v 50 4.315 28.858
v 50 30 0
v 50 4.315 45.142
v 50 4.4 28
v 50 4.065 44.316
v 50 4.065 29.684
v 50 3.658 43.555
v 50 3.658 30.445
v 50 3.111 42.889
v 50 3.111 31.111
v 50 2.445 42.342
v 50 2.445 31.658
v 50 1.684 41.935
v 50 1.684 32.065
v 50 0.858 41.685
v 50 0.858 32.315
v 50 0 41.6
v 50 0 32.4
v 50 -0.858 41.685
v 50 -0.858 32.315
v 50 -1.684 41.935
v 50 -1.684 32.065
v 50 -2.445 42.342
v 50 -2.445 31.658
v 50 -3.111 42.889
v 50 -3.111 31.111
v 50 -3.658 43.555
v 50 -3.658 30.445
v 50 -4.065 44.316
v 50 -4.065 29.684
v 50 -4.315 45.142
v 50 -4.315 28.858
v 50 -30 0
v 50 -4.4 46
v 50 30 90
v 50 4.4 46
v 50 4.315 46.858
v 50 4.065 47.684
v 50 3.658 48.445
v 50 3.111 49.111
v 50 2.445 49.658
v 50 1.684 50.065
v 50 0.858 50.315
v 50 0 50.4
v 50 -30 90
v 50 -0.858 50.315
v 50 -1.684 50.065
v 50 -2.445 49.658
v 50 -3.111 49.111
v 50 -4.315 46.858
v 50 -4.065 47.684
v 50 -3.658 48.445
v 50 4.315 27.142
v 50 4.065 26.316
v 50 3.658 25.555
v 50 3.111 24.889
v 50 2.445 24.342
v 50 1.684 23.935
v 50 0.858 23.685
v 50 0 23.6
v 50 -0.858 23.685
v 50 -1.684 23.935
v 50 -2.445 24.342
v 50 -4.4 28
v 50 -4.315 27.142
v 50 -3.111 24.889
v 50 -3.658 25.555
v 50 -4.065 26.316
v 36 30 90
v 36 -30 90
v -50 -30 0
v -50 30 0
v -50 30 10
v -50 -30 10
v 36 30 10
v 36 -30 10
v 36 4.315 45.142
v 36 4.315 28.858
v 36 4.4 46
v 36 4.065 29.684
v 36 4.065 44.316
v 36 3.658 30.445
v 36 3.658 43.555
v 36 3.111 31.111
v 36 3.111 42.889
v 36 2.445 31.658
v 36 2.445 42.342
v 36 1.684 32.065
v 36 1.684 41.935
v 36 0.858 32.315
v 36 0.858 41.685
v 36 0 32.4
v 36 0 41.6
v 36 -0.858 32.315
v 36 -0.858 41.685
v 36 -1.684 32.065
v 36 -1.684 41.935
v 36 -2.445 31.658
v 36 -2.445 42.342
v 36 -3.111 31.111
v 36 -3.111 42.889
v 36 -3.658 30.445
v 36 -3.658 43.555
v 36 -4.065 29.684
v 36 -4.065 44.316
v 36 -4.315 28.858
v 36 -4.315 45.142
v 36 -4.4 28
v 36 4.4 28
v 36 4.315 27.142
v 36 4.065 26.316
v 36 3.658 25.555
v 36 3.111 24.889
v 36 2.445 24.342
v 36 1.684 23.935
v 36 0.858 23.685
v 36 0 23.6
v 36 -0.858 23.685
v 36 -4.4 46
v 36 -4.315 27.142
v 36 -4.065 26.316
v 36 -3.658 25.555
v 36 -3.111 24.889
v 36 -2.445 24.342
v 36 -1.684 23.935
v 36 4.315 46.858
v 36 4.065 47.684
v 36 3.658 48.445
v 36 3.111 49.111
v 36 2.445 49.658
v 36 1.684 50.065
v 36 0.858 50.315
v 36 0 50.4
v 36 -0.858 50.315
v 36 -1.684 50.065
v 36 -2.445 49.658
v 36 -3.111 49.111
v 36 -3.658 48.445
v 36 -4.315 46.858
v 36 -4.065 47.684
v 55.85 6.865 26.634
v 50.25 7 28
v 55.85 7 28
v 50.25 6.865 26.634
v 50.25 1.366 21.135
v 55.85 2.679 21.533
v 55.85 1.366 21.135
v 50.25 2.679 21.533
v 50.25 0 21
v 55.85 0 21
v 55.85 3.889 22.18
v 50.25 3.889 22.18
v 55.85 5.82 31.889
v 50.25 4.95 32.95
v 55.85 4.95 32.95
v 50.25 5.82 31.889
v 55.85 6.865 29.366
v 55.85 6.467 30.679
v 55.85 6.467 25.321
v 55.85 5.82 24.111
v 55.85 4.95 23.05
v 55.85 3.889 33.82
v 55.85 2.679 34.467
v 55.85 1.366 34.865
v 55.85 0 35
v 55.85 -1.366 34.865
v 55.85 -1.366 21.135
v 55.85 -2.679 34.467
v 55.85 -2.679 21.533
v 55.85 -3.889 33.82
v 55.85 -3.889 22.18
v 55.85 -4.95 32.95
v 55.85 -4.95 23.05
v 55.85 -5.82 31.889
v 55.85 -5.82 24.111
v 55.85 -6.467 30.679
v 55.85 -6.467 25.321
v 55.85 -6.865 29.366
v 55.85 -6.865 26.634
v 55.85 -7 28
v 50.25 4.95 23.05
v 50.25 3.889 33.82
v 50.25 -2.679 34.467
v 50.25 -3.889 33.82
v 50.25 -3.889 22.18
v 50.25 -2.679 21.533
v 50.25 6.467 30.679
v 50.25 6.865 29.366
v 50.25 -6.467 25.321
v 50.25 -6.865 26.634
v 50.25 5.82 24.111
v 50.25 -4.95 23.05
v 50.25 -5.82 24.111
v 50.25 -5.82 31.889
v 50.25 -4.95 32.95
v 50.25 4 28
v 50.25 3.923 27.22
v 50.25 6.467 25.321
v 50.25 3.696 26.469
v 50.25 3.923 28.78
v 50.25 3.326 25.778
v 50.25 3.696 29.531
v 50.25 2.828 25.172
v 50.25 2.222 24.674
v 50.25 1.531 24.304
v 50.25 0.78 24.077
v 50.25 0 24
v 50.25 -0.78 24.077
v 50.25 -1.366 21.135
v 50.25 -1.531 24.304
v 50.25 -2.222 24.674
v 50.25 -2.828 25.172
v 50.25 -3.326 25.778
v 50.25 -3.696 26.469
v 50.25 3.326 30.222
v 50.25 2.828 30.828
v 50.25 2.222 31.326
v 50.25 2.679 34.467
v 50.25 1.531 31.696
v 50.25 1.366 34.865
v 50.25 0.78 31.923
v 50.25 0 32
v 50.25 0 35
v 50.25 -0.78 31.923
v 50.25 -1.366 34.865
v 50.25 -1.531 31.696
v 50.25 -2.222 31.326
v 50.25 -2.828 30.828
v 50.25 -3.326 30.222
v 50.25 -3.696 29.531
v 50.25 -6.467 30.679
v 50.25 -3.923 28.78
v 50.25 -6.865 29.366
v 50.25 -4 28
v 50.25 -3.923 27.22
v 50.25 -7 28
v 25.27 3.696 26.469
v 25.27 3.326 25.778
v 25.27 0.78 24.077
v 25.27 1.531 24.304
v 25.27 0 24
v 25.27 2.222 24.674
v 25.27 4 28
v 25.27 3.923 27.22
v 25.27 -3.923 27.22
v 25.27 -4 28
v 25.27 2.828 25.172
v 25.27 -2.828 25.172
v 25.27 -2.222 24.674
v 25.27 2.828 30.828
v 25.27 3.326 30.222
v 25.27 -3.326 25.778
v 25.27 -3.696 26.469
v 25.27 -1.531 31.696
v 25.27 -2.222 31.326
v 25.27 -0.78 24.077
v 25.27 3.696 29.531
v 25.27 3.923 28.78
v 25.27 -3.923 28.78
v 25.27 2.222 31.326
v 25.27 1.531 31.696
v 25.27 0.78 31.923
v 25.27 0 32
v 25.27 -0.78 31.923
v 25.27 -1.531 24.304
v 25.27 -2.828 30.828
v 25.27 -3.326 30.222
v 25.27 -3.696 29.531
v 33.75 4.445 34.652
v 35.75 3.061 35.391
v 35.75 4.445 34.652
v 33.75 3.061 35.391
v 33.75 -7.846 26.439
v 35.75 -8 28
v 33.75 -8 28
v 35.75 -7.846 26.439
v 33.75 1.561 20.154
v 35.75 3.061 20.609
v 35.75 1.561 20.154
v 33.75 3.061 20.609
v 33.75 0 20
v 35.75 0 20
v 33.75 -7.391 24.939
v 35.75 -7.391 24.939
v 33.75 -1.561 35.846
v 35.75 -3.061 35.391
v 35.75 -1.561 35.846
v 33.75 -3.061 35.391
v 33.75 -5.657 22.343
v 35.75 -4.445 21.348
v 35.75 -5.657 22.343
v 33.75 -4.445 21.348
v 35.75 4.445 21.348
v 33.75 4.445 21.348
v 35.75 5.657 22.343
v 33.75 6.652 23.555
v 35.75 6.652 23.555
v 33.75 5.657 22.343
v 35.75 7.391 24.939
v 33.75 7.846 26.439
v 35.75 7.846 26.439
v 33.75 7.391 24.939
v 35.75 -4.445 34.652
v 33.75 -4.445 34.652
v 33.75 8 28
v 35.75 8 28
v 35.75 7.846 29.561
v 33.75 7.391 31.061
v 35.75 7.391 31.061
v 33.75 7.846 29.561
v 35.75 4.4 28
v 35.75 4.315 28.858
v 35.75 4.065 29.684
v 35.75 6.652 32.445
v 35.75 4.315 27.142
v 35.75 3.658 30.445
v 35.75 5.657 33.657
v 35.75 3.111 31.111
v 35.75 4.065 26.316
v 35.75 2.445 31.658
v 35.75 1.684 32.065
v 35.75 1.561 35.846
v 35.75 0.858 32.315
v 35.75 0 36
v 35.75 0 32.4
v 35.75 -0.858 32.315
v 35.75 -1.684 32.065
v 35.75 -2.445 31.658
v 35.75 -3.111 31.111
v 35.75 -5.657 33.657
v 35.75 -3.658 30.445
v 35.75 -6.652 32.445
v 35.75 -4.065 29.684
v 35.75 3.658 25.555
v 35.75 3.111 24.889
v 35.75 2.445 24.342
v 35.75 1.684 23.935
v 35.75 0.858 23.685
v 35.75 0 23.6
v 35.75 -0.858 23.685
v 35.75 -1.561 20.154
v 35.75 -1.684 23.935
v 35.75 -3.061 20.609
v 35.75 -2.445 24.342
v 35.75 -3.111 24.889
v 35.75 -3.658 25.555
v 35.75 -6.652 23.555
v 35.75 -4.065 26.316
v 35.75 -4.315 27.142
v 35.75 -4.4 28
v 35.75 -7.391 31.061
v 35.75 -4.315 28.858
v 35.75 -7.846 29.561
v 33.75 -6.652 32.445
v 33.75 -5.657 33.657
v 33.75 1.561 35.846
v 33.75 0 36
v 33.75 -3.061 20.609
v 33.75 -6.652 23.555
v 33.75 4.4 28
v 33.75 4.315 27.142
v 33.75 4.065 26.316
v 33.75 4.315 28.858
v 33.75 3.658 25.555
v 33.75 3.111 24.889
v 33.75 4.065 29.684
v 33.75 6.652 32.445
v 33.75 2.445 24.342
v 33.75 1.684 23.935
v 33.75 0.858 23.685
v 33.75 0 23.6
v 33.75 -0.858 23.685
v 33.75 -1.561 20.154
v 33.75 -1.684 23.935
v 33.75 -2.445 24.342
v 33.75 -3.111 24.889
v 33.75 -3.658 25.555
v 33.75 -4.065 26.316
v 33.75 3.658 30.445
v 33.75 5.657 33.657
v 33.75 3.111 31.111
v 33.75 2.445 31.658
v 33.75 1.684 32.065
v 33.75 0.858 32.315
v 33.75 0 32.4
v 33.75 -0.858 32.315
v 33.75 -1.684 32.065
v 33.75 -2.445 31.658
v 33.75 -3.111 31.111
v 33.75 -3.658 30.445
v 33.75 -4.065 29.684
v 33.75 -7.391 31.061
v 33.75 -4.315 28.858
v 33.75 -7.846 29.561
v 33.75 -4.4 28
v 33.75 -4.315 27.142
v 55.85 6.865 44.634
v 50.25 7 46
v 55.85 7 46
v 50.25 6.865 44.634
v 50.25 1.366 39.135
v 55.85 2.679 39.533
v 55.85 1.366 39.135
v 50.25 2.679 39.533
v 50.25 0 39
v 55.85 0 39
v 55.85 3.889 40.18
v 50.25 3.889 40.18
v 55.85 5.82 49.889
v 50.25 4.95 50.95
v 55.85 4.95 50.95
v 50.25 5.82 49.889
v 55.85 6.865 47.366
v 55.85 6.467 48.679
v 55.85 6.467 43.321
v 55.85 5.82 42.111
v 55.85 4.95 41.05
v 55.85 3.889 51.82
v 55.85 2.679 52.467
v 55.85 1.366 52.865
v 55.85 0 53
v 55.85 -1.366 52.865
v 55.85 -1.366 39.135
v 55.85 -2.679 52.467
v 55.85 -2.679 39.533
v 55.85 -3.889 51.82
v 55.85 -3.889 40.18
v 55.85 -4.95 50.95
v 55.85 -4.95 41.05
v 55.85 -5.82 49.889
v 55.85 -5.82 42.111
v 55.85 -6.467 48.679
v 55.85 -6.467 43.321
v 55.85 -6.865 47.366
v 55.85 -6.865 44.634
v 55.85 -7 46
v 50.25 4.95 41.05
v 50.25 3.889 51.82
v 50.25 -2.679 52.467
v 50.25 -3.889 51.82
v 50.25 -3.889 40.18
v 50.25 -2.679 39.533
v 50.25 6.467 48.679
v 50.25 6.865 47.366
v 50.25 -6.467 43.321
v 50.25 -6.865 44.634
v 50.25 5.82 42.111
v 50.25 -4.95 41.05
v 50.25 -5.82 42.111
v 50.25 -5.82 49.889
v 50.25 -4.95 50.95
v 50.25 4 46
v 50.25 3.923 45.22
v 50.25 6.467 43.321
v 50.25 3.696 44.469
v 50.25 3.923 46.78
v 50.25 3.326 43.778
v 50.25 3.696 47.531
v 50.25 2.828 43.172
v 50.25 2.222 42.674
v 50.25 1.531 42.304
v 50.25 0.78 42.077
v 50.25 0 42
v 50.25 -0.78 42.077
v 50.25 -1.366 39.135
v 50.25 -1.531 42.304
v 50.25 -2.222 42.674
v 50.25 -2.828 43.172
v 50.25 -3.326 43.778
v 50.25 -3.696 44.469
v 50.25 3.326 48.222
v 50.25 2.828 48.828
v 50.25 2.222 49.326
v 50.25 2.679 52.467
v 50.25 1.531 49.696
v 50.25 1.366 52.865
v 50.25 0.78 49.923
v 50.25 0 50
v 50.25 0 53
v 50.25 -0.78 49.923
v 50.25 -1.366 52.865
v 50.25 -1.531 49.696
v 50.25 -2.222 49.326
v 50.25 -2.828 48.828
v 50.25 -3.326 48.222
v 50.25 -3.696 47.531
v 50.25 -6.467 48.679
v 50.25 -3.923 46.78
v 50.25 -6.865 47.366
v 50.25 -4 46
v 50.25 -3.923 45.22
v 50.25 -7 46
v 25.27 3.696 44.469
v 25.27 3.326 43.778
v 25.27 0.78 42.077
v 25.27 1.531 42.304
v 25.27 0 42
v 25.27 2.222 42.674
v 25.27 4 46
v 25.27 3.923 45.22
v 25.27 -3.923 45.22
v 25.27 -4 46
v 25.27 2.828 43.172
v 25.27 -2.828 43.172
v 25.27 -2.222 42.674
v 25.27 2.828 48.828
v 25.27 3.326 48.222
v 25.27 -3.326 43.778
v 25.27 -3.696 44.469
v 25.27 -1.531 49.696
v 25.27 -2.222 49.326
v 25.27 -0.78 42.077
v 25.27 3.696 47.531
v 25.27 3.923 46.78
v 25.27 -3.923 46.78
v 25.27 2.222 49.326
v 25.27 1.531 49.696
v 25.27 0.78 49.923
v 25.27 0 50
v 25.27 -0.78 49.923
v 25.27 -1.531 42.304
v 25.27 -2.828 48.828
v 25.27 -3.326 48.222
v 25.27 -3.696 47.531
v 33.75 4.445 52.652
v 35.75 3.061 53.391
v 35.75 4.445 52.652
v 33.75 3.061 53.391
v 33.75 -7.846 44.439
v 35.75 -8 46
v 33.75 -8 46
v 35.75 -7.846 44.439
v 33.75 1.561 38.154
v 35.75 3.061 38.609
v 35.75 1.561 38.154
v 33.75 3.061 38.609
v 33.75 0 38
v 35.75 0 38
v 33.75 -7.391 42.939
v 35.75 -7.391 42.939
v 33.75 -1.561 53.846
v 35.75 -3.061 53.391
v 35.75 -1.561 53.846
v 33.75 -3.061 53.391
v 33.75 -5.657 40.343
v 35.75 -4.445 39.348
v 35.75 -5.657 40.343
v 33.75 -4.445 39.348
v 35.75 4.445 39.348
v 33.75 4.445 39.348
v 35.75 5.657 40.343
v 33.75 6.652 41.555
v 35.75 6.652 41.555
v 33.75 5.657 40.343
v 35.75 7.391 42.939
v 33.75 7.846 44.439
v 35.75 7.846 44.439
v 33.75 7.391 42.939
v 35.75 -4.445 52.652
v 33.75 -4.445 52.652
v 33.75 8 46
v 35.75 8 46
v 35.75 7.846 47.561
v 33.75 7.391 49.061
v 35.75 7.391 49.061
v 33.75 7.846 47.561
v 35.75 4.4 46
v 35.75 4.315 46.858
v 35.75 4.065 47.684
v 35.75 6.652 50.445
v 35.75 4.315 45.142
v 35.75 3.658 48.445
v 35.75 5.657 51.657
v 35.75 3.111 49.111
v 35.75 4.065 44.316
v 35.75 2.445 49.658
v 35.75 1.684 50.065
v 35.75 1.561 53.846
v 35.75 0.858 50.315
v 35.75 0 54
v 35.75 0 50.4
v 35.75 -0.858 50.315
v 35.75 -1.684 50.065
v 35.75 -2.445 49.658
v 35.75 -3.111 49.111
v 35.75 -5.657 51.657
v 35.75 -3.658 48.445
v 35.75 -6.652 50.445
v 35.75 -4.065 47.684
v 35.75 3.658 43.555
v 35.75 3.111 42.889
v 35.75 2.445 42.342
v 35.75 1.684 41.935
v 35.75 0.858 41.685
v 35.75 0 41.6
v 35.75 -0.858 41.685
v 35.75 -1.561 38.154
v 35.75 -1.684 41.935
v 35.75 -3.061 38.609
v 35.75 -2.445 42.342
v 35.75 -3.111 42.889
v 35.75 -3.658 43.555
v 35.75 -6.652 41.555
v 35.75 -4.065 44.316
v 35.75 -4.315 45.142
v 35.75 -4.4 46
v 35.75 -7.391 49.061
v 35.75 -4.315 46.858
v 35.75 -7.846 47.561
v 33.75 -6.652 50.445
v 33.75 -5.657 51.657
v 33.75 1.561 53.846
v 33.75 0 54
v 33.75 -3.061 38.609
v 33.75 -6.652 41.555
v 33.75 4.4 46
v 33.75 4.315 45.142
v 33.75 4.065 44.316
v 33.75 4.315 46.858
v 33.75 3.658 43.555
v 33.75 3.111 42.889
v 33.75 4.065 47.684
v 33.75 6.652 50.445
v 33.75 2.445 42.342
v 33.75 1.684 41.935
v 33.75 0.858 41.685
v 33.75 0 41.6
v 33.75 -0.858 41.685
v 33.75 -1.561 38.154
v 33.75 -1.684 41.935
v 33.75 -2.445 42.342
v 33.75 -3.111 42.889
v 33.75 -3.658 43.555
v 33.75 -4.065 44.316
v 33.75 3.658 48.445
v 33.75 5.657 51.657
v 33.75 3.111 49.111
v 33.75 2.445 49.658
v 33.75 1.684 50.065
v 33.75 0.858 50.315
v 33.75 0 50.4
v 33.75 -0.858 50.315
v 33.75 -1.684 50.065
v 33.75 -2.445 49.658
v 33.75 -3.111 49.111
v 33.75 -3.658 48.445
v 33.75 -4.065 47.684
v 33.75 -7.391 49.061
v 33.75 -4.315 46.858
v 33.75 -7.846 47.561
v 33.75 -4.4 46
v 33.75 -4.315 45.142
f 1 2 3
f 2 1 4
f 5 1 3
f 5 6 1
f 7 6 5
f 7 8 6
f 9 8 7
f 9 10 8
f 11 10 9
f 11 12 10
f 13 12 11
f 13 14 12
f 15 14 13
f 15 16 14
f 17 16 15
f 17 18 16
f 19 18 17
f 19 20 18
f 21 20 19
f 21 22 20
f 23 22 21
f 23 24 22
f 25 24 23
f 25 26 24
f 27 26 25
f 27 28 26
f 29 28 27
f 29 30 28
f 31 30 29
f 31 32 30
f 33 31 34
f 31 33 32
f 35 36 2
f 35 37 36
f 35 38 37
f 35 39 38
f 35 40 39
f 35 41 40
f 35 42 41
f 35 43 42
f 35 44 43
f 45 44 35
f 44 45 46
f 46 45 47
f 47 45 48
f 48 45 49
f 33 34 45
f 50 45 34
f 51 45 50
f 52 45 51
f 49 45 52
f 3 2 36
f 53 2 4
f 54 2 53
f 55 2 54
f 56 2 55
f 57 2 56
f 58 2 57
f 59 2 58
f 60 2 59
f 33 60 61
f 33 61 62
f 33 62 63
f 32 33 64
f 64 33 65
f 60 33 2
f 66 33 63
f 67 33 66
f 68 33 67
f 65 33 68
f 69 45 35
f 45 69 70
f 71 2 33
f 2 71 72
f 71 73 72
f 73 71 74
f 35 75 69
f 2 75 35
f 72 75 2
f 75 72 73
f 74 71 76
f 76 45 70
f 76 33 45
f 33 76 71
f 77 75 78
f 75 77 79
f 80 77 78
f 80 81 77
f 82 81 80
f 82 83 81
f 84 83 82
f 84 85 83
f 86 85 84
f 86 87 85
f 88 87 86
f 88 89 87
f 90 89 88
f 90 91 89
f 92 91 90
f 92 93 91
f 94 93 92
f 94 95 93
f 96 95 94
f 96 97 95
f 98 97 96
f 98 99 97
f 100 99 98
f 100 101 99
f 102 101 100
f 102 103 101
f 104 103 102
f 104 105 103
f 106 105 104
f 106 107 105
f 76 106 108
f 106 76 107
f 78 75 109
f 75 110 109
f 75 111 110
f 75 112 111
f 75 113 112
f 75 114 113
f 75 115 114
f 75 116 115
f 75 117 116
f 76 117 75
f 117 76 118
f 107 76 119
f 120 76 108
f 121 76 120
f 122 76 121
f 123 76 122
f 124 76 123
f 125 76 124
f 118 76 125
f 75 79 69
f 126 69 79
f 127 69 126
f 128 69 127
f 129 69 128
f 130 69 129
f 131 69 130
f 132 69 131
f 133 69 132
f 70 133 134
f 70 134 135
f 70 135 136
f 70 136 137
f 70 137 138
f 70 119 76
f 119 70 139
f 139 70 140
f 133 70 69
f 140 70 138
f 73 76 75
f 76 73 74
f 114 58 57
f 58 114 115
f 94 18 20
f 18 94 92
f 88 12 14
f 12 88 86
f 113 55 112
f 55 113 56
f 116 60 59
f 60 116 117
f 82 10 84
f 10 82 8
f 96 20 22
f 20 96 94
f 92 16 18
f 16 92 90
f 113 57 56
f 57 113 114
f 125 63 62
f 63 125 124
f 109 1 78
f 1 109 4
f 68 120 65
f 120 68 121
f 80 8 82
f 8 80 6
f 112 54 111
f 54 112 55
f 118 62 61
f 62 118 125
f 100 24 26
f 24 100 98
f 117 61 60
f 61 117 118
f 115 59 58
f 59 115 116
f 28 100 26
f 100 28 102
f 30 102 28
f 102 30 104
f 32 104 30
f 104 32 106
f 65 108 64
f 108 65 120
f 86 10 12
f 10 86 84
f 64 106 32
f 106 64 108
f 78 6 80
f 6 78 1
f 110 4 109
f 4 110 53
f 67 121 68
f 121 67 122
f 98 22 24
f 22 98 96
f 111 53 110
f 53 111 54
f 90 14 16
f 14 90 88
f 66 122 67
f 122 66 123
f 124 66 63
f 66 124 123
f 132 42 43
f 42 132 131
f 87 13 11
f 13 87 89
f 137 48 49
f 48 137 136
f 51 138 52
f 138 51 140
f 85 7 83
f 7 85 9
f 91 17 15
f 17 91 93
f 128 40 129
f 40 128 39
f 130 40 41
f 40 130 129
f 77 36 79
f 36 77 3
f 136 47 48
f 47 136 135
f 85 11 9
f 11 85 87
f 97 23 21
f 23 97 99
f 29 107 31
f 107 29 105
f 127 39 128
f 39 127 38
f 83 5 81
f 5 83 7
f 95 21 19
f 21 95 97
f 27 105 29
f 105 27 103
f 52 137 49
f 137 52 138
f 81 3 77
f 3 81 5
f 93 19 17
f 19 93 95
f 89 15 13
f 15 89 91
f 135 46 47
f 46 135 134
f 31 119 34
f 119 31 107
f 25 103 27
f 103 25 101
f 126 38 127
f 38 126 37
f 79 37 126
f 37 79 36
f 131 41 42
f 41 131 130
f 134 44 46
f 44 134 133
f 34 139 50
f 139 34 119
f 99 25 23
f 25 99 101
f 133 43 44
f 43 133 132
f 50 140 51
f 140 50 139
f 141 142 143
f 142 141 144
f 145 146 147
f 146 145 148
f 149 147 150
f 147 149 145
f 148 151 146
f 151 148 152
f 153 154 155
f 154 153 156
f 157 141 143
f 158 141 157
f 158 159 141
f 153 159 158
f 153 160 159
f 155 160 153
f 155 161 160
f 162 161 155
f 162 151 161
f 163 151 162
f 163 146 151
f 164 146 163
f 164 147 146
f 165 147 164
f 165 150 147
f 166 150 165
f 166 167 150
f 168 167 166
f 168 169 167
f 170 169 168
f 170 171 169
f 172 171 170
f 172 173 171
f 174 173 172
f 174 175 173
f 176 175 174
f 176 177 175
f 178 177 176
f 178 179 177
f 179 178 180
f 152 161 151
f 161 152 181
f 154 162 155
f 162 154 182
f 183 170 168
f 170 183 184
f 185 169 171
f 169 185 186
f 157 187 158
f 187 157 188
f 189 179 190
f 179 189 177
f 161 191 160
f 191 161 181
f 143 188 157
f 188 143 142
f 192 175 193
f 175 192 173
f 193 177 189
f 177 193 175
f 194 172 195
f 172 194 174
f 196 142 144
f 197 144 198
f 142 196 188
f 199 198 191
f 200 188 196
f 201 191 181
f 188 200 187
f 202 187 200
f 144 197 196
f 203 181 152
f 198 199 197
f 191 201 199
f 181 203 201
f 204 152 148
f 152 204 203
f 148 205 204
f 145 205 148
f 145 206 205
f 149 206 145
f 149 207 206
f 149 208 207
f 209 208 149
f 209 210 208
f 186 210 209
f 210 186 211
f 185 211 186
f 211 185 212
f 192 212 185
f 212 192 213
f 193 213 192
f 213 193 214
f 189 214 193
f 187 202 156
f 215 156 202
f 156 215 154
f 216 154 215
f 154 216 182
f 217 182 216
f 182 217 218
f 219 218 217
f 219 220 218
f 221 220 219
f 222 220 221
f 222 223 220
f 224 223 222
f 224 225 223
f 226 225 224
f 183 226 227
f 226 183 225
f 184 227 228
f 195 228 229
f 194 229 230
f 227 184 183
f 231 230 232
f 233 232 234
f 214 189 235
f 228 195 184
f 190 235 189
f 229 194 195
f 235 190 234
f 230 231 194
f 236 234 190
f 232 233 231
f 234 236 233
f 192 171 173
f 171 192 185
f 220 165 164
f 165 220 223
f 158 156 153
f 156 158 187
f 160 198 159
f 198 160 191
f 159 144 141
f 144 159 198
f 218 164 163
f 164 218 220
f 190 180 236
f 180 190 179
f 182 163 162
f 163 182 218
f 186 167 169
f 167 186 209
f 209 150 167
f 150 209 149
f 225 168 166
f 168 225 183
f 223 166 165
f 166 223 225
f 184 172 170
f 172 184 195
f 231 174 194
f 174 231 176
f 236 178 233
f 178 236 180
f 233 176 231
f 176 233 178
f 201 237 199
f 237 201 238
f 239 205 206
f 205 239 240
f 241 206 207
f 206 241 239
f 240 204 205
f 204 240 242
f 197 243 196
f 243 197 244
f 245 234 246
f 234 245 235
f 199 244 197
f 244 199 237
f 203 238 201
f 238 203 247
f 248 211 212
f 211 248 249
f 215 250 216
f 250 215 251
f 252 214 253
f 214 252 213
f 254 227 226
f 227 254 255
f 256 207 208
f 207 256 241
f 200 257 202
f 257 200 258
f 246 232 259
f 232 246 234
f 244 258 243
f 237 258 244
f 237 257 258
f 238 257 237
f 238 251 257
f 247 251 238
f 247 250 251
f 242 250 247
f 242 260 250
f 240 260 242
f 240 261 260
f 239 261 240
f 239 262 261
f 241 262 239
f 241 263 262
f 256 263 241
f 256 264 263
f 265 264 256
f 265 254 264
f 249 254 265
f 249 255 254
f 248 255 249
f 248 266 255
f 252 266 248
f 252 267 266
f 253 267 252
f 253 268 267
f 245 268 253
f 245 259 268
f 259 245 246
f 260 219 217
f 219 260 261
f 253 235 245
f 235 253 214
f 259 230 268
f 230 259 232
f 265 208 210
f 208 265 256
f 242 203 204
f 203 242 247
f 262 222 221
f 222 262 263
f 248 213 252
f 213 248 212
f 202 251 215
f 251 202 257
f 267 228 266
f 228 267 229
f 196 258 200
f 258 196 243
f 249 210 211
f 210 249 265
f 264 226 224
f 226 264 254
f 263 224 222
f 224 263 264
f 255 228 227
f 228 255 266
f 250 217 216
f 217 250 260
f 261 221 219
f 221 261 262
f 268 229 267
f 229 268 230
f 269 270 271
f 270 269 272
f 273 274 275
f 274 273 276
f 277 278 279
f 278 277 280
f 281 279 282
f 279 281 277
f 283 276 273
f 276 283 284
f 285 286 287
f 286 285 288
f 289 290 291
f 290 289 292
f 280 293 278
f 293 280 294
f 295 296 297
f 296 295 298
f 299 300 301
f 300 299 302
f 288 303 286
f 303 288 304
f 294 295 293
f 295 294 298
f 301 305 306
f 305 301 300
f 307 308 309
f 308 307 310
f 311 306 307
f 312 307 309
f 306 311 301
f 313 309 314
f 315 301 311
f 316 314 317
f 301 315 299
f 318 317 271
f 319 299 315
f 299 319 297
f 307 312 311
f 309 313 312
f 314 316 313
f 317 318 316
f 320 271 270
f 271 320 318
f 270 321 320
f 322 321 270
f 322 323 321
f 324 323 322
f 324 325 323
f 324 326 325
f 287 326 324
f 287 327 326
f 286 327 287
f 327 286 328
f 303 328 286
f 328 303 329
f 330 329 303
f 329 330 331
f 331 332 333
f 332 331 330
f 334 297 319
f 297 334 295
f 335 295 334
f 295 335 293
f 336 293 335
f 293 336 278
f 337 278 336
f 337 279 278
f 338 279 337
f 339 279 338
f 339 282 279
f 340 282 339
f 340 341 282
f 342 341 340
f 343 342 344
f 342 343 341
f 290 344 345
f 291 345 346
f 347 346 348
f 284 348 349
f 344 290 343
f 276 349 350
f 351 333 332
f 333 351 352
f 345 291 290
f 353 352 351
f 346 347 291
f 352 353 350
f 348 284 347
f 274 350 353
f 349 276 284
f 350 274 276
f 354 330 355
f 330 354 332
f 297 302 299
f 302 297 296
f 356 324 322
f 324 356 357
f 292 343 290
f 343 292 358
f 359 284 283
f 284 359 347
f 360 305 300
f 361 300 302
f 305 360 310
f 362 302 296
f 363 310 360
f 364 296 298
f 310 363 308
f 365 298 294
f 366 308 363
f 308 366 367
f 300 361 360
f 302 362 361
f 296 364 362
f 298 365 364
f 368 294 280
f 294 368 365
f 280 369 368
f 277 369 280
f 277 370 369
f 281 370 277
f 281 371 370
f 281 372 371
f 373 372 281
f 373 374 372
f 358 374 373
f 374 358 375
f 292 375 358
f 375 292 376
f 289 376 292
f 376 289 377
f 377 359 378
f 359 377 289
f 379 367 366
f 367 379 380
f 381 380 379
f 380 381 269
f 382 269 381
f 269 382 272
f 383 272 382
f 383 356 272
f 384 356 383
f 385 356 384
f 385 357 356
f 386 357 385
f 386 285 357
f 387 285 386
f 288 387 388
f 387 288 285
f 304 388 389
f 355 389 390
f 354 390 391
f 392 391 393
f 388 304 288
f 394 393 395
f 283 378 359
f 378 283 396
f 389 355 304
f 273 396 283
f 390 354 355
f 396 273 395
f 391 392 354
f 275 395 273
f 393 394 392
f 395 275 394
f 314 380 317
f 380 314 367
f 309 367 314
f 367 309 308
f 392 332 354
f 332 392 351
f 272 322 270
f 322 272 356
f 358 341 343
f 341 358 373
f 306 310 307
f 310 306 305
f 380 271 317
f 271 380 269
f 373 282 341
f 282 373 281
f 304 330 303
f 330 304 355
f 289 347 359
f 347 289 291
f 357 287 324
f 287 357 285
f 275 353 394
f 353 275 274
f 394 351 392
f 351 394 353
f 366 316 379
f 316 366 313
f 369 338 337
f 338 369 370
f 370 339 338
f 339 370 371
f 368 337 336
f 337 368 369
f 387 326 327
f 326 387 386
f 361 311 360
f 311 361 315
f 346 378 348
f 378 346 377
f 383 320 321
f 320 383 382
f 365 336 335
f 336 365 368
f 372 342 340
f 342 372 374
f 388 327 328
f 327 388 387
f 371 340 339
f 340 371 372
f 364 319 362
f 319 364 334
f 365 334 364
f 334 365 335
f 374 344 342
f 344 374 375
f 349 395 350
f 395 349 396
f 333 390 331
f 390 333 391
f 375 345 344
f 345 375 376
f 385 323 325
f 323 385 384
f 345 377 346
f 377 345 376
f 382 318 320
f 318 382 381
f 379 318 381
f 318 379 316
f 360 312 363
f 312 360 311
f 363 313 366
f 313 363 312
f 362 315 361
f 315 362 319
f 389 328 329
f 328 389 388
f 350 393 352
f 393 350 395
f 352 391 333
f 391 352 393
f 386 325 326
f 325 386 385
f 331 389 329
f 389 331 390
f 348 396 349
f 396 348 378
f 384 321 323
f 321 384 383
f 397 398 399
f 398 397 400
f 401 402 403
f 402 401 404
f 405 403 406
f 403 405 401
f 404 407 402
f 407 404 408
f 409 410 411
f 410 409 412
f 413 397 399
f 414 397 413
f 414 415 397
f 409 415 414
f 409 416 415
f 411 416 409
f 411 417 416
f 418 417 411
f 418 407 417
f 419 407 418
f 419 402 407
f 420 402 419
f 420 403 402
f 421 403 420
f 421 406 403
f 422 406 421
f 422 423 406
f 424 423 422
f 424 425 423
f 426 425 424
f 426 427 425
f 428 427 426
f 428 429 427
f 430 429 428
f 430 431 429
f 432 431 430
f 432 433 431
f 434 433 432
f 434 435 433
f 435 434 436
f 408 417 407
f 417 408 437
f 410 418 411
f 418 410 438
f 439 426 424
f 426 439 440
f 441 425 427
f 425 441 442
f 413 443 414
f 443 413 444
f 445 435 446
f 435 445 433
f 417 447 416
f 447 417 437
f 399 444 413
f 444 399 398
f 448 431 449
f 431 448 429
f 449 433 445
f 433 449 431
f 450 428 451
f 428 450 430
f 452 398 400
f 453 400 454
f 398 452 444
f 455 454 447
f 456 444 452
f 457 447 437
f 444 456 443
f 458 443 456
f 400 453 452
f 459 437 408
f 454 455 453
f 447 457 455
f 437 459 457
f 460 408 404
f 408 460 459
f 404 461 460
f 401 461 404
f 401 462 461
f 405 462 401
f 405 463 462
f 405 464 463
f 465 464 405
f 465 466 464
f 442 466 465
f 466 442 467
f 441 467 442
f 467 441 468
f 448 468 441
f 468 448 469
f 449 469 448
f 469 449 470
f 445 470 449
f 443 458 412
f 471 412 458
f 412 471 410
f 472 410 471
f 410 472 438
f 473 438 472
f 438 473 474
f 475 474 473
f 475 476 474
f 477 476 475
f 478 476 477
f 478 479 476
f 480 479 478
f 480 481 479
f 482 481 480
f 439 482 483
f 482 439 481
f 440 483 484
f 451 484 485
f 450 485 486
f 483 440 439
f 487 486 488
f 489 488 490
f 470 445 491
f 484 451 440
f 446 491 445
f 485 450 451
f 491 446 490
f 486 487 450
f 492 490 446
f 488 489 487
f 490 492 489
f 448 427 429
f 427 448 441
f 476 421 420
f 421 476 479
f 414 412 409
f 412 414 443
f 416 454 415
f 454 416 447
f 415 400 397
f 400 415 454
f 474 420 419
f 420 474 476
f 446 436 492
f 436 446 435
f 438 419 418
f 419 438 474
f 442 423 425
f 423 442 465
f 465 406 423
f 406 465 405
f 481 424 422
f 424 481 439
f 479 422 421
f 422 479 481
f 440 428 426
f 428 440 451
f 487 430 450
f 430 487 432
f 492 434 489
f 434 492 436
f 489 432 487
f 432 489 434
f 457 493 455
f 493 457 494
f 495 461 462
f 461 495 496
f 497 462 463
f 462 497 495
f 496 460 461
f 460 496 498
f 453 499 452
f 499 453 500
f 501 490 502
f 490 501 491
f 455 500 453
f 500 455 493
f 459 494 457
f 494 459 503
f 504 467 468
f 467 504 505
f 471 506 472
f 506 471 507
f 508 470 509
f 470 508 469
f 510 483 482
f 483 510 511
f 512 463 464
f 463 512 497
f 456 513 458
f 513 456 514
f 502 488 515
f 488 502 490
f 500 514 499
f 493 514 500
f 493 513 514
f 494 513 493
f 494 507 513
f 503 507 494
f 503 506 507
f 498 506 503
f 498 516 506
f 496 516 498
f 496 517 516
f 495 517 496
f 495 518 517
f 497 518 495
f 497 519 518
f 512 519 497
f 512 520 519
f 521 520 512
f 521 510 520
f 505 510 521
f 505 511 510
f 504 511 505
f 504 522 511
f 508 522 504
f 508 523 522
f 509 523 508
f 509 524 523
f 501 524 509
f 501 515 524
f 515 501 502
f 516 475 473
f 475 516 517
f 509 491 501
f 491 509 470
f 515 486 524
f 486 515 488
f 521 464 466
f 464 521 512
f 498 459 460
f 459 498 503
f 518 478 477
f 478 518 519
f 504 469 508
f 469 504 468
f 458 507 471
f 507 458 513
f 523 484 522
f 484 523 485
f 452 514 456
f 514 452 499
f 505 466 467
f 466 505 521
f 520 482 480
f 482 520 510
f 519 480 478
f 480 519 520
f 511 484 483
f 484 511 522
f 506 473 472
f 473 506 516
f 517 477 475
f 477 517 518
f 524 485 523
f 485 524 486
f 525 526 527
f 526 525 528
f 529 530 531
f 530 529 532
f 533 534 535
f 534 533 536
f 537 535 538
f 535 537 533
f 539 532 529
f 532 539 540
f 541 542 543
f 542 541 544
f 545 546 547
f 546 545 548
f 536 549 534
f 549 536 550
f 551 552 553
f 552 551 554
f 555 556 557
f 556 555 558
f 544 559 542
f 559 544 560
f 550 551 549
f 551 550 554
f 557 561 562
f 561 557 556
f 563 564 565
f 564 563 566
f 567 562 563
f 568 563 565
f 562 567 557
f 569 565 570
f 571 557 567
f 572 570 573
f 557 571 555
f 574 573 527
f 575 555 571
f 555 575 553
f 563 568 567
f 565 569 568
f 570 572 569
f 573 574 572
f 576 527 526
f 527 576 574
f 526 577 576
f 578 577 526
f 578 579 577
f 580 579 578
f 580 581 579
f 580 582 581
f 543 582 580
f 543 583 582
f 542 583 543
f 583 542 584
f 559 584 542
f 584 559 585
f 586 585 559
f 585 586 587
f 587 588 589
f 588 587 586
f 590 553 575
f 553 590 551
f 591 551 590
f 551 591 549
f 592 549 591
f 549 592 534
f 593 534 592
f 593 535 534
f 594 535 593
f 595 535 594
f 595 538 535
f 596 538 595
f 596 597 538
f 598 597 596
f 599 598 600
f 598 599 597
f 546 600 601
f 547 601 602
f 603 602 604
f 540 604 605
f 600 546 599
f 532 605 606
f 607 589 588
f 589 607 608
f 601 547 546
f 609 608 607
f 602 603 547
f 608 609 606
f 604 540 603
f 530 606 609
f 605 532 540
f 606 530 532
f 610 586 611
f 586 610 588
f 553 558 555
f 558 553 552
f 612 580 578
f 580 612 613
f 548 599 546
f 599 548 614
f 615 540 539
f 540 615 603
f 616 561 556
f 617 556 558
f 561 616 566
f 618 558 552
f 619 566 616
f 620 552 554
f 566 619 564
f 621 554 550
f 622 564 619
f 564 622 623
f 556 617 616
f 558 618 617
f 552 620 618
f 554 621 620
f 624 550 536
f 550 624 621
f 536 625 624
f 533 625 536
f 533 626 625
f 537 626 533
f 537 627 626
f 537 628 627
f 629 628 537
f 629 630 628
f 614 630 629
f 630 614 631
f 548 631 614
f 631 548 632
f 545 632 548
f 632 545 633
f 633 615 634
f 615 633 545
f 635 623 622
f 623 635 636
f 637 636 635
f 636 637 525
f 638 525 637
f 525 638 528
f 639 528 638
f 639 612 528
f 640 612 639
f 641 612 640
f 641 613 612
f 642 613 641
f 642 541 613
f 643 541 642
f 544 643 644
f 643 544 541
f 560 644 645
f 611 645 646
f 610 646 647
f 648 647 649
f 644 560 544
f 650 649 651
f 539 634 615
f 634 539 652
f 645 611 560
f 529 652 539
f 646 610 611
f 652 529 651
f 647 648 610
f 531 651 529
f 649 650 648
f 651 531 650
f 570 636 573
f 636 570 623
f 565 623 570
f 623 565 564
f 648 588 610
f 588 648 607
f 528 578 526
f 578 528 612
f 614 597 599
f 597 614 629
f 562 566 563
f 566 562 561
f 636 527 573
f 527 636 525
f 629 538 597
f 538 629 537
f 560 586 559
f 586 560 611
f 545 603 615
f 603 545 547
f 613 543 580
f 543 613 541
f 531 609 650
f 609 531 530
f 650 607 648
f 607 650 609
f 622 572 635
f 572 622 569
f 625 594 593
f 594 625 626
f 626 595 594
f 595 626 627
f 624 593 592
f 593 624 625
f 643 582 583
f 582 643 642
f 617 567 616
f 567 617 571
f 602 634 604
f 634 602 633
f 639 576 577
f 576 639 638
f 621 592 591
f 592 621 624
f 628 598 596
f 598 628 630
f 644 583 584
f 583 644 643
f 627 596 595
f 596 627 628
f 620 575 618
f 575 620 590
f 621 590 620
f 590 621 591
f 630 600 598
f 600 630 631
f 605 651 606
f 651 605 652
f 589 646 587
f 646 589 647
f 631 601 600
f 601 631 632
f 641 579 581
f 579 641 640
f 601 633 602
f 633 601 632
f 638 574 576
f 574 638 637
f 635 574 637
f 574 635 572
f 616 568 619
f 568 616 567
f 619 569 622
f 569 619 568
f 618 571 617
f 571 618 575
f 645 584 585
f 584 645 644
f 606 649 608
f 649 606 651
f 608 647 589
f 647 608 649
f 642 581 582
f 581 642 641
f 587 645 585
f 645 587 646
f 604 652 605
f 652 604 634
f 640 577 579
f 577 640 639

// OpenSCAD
$fn = 32;

// ------------------------------------------------------------------------
// Bolted bracket: 100 x 60 mm bracket with 2 bolt joints
// Every part is its own module, assembly() places them once.
// ------------------------------------------------------------------------

// --- part 1 ---
module bracket() {
  difference() {
    translate([-50, -30, 0]) cube([100, 60, 90]);
    translate([-51, -31, 10]) cube([87, 62, 81]);
    translate([43, 0, 28]) rotate([0, 90, 0]) cylinder(h = 16, d = 8.8, center = true);
    translate([43, 0, 46]) rotate([0, 90, 0]) cylinder(h = 16, d = 8.8, center = true);
  }
}

// --- part 2 ---
module bolt1() {
  cylinder(h = 5.6, d = 14);
  translate([0, 0, -24.98]) cylinder(h = 24.98, d = 8);
}

// --- part 3 ---
module washer1() {
  difference() {
      translate([0, 0, 0]) cylinder(h = 2, d = 16);
      translate([0, 0, -1]) cylinder(h = 4, d = 8.8);
    }
}

// --- part 4 ---
module bolt2() {
  cylinder(h = 5.6, d = 14);
  translate([0, 0, -24.98]) cylinder(h = 24.98, d = 8);
}

// --- part 5 ---
module washer2() {
  difference() {
      translate([0, 0, 0]) cylinder(h = 2, d = 16);
      translate([0, 0, -1]) cylinder(h = 4, d = 8.8);
    }
}

// --- assembly ---
module assembly() {
  translate([0, 0, 0]) rotate([0, 0, 0]) bracket();
  translate([50.25, 0, 28]) rotate([0, 90, 0]) bolt1();
  translate([33.75, 0, 28]) rotate([0, 90, 0]) washer1();
  translate([50.25, 0, 46]) rotate([0, 90, 0]) bolt2();
  translate([33.75, 0, 46]) rotate([0, 90, 0]) washer2();
}

assembly();
